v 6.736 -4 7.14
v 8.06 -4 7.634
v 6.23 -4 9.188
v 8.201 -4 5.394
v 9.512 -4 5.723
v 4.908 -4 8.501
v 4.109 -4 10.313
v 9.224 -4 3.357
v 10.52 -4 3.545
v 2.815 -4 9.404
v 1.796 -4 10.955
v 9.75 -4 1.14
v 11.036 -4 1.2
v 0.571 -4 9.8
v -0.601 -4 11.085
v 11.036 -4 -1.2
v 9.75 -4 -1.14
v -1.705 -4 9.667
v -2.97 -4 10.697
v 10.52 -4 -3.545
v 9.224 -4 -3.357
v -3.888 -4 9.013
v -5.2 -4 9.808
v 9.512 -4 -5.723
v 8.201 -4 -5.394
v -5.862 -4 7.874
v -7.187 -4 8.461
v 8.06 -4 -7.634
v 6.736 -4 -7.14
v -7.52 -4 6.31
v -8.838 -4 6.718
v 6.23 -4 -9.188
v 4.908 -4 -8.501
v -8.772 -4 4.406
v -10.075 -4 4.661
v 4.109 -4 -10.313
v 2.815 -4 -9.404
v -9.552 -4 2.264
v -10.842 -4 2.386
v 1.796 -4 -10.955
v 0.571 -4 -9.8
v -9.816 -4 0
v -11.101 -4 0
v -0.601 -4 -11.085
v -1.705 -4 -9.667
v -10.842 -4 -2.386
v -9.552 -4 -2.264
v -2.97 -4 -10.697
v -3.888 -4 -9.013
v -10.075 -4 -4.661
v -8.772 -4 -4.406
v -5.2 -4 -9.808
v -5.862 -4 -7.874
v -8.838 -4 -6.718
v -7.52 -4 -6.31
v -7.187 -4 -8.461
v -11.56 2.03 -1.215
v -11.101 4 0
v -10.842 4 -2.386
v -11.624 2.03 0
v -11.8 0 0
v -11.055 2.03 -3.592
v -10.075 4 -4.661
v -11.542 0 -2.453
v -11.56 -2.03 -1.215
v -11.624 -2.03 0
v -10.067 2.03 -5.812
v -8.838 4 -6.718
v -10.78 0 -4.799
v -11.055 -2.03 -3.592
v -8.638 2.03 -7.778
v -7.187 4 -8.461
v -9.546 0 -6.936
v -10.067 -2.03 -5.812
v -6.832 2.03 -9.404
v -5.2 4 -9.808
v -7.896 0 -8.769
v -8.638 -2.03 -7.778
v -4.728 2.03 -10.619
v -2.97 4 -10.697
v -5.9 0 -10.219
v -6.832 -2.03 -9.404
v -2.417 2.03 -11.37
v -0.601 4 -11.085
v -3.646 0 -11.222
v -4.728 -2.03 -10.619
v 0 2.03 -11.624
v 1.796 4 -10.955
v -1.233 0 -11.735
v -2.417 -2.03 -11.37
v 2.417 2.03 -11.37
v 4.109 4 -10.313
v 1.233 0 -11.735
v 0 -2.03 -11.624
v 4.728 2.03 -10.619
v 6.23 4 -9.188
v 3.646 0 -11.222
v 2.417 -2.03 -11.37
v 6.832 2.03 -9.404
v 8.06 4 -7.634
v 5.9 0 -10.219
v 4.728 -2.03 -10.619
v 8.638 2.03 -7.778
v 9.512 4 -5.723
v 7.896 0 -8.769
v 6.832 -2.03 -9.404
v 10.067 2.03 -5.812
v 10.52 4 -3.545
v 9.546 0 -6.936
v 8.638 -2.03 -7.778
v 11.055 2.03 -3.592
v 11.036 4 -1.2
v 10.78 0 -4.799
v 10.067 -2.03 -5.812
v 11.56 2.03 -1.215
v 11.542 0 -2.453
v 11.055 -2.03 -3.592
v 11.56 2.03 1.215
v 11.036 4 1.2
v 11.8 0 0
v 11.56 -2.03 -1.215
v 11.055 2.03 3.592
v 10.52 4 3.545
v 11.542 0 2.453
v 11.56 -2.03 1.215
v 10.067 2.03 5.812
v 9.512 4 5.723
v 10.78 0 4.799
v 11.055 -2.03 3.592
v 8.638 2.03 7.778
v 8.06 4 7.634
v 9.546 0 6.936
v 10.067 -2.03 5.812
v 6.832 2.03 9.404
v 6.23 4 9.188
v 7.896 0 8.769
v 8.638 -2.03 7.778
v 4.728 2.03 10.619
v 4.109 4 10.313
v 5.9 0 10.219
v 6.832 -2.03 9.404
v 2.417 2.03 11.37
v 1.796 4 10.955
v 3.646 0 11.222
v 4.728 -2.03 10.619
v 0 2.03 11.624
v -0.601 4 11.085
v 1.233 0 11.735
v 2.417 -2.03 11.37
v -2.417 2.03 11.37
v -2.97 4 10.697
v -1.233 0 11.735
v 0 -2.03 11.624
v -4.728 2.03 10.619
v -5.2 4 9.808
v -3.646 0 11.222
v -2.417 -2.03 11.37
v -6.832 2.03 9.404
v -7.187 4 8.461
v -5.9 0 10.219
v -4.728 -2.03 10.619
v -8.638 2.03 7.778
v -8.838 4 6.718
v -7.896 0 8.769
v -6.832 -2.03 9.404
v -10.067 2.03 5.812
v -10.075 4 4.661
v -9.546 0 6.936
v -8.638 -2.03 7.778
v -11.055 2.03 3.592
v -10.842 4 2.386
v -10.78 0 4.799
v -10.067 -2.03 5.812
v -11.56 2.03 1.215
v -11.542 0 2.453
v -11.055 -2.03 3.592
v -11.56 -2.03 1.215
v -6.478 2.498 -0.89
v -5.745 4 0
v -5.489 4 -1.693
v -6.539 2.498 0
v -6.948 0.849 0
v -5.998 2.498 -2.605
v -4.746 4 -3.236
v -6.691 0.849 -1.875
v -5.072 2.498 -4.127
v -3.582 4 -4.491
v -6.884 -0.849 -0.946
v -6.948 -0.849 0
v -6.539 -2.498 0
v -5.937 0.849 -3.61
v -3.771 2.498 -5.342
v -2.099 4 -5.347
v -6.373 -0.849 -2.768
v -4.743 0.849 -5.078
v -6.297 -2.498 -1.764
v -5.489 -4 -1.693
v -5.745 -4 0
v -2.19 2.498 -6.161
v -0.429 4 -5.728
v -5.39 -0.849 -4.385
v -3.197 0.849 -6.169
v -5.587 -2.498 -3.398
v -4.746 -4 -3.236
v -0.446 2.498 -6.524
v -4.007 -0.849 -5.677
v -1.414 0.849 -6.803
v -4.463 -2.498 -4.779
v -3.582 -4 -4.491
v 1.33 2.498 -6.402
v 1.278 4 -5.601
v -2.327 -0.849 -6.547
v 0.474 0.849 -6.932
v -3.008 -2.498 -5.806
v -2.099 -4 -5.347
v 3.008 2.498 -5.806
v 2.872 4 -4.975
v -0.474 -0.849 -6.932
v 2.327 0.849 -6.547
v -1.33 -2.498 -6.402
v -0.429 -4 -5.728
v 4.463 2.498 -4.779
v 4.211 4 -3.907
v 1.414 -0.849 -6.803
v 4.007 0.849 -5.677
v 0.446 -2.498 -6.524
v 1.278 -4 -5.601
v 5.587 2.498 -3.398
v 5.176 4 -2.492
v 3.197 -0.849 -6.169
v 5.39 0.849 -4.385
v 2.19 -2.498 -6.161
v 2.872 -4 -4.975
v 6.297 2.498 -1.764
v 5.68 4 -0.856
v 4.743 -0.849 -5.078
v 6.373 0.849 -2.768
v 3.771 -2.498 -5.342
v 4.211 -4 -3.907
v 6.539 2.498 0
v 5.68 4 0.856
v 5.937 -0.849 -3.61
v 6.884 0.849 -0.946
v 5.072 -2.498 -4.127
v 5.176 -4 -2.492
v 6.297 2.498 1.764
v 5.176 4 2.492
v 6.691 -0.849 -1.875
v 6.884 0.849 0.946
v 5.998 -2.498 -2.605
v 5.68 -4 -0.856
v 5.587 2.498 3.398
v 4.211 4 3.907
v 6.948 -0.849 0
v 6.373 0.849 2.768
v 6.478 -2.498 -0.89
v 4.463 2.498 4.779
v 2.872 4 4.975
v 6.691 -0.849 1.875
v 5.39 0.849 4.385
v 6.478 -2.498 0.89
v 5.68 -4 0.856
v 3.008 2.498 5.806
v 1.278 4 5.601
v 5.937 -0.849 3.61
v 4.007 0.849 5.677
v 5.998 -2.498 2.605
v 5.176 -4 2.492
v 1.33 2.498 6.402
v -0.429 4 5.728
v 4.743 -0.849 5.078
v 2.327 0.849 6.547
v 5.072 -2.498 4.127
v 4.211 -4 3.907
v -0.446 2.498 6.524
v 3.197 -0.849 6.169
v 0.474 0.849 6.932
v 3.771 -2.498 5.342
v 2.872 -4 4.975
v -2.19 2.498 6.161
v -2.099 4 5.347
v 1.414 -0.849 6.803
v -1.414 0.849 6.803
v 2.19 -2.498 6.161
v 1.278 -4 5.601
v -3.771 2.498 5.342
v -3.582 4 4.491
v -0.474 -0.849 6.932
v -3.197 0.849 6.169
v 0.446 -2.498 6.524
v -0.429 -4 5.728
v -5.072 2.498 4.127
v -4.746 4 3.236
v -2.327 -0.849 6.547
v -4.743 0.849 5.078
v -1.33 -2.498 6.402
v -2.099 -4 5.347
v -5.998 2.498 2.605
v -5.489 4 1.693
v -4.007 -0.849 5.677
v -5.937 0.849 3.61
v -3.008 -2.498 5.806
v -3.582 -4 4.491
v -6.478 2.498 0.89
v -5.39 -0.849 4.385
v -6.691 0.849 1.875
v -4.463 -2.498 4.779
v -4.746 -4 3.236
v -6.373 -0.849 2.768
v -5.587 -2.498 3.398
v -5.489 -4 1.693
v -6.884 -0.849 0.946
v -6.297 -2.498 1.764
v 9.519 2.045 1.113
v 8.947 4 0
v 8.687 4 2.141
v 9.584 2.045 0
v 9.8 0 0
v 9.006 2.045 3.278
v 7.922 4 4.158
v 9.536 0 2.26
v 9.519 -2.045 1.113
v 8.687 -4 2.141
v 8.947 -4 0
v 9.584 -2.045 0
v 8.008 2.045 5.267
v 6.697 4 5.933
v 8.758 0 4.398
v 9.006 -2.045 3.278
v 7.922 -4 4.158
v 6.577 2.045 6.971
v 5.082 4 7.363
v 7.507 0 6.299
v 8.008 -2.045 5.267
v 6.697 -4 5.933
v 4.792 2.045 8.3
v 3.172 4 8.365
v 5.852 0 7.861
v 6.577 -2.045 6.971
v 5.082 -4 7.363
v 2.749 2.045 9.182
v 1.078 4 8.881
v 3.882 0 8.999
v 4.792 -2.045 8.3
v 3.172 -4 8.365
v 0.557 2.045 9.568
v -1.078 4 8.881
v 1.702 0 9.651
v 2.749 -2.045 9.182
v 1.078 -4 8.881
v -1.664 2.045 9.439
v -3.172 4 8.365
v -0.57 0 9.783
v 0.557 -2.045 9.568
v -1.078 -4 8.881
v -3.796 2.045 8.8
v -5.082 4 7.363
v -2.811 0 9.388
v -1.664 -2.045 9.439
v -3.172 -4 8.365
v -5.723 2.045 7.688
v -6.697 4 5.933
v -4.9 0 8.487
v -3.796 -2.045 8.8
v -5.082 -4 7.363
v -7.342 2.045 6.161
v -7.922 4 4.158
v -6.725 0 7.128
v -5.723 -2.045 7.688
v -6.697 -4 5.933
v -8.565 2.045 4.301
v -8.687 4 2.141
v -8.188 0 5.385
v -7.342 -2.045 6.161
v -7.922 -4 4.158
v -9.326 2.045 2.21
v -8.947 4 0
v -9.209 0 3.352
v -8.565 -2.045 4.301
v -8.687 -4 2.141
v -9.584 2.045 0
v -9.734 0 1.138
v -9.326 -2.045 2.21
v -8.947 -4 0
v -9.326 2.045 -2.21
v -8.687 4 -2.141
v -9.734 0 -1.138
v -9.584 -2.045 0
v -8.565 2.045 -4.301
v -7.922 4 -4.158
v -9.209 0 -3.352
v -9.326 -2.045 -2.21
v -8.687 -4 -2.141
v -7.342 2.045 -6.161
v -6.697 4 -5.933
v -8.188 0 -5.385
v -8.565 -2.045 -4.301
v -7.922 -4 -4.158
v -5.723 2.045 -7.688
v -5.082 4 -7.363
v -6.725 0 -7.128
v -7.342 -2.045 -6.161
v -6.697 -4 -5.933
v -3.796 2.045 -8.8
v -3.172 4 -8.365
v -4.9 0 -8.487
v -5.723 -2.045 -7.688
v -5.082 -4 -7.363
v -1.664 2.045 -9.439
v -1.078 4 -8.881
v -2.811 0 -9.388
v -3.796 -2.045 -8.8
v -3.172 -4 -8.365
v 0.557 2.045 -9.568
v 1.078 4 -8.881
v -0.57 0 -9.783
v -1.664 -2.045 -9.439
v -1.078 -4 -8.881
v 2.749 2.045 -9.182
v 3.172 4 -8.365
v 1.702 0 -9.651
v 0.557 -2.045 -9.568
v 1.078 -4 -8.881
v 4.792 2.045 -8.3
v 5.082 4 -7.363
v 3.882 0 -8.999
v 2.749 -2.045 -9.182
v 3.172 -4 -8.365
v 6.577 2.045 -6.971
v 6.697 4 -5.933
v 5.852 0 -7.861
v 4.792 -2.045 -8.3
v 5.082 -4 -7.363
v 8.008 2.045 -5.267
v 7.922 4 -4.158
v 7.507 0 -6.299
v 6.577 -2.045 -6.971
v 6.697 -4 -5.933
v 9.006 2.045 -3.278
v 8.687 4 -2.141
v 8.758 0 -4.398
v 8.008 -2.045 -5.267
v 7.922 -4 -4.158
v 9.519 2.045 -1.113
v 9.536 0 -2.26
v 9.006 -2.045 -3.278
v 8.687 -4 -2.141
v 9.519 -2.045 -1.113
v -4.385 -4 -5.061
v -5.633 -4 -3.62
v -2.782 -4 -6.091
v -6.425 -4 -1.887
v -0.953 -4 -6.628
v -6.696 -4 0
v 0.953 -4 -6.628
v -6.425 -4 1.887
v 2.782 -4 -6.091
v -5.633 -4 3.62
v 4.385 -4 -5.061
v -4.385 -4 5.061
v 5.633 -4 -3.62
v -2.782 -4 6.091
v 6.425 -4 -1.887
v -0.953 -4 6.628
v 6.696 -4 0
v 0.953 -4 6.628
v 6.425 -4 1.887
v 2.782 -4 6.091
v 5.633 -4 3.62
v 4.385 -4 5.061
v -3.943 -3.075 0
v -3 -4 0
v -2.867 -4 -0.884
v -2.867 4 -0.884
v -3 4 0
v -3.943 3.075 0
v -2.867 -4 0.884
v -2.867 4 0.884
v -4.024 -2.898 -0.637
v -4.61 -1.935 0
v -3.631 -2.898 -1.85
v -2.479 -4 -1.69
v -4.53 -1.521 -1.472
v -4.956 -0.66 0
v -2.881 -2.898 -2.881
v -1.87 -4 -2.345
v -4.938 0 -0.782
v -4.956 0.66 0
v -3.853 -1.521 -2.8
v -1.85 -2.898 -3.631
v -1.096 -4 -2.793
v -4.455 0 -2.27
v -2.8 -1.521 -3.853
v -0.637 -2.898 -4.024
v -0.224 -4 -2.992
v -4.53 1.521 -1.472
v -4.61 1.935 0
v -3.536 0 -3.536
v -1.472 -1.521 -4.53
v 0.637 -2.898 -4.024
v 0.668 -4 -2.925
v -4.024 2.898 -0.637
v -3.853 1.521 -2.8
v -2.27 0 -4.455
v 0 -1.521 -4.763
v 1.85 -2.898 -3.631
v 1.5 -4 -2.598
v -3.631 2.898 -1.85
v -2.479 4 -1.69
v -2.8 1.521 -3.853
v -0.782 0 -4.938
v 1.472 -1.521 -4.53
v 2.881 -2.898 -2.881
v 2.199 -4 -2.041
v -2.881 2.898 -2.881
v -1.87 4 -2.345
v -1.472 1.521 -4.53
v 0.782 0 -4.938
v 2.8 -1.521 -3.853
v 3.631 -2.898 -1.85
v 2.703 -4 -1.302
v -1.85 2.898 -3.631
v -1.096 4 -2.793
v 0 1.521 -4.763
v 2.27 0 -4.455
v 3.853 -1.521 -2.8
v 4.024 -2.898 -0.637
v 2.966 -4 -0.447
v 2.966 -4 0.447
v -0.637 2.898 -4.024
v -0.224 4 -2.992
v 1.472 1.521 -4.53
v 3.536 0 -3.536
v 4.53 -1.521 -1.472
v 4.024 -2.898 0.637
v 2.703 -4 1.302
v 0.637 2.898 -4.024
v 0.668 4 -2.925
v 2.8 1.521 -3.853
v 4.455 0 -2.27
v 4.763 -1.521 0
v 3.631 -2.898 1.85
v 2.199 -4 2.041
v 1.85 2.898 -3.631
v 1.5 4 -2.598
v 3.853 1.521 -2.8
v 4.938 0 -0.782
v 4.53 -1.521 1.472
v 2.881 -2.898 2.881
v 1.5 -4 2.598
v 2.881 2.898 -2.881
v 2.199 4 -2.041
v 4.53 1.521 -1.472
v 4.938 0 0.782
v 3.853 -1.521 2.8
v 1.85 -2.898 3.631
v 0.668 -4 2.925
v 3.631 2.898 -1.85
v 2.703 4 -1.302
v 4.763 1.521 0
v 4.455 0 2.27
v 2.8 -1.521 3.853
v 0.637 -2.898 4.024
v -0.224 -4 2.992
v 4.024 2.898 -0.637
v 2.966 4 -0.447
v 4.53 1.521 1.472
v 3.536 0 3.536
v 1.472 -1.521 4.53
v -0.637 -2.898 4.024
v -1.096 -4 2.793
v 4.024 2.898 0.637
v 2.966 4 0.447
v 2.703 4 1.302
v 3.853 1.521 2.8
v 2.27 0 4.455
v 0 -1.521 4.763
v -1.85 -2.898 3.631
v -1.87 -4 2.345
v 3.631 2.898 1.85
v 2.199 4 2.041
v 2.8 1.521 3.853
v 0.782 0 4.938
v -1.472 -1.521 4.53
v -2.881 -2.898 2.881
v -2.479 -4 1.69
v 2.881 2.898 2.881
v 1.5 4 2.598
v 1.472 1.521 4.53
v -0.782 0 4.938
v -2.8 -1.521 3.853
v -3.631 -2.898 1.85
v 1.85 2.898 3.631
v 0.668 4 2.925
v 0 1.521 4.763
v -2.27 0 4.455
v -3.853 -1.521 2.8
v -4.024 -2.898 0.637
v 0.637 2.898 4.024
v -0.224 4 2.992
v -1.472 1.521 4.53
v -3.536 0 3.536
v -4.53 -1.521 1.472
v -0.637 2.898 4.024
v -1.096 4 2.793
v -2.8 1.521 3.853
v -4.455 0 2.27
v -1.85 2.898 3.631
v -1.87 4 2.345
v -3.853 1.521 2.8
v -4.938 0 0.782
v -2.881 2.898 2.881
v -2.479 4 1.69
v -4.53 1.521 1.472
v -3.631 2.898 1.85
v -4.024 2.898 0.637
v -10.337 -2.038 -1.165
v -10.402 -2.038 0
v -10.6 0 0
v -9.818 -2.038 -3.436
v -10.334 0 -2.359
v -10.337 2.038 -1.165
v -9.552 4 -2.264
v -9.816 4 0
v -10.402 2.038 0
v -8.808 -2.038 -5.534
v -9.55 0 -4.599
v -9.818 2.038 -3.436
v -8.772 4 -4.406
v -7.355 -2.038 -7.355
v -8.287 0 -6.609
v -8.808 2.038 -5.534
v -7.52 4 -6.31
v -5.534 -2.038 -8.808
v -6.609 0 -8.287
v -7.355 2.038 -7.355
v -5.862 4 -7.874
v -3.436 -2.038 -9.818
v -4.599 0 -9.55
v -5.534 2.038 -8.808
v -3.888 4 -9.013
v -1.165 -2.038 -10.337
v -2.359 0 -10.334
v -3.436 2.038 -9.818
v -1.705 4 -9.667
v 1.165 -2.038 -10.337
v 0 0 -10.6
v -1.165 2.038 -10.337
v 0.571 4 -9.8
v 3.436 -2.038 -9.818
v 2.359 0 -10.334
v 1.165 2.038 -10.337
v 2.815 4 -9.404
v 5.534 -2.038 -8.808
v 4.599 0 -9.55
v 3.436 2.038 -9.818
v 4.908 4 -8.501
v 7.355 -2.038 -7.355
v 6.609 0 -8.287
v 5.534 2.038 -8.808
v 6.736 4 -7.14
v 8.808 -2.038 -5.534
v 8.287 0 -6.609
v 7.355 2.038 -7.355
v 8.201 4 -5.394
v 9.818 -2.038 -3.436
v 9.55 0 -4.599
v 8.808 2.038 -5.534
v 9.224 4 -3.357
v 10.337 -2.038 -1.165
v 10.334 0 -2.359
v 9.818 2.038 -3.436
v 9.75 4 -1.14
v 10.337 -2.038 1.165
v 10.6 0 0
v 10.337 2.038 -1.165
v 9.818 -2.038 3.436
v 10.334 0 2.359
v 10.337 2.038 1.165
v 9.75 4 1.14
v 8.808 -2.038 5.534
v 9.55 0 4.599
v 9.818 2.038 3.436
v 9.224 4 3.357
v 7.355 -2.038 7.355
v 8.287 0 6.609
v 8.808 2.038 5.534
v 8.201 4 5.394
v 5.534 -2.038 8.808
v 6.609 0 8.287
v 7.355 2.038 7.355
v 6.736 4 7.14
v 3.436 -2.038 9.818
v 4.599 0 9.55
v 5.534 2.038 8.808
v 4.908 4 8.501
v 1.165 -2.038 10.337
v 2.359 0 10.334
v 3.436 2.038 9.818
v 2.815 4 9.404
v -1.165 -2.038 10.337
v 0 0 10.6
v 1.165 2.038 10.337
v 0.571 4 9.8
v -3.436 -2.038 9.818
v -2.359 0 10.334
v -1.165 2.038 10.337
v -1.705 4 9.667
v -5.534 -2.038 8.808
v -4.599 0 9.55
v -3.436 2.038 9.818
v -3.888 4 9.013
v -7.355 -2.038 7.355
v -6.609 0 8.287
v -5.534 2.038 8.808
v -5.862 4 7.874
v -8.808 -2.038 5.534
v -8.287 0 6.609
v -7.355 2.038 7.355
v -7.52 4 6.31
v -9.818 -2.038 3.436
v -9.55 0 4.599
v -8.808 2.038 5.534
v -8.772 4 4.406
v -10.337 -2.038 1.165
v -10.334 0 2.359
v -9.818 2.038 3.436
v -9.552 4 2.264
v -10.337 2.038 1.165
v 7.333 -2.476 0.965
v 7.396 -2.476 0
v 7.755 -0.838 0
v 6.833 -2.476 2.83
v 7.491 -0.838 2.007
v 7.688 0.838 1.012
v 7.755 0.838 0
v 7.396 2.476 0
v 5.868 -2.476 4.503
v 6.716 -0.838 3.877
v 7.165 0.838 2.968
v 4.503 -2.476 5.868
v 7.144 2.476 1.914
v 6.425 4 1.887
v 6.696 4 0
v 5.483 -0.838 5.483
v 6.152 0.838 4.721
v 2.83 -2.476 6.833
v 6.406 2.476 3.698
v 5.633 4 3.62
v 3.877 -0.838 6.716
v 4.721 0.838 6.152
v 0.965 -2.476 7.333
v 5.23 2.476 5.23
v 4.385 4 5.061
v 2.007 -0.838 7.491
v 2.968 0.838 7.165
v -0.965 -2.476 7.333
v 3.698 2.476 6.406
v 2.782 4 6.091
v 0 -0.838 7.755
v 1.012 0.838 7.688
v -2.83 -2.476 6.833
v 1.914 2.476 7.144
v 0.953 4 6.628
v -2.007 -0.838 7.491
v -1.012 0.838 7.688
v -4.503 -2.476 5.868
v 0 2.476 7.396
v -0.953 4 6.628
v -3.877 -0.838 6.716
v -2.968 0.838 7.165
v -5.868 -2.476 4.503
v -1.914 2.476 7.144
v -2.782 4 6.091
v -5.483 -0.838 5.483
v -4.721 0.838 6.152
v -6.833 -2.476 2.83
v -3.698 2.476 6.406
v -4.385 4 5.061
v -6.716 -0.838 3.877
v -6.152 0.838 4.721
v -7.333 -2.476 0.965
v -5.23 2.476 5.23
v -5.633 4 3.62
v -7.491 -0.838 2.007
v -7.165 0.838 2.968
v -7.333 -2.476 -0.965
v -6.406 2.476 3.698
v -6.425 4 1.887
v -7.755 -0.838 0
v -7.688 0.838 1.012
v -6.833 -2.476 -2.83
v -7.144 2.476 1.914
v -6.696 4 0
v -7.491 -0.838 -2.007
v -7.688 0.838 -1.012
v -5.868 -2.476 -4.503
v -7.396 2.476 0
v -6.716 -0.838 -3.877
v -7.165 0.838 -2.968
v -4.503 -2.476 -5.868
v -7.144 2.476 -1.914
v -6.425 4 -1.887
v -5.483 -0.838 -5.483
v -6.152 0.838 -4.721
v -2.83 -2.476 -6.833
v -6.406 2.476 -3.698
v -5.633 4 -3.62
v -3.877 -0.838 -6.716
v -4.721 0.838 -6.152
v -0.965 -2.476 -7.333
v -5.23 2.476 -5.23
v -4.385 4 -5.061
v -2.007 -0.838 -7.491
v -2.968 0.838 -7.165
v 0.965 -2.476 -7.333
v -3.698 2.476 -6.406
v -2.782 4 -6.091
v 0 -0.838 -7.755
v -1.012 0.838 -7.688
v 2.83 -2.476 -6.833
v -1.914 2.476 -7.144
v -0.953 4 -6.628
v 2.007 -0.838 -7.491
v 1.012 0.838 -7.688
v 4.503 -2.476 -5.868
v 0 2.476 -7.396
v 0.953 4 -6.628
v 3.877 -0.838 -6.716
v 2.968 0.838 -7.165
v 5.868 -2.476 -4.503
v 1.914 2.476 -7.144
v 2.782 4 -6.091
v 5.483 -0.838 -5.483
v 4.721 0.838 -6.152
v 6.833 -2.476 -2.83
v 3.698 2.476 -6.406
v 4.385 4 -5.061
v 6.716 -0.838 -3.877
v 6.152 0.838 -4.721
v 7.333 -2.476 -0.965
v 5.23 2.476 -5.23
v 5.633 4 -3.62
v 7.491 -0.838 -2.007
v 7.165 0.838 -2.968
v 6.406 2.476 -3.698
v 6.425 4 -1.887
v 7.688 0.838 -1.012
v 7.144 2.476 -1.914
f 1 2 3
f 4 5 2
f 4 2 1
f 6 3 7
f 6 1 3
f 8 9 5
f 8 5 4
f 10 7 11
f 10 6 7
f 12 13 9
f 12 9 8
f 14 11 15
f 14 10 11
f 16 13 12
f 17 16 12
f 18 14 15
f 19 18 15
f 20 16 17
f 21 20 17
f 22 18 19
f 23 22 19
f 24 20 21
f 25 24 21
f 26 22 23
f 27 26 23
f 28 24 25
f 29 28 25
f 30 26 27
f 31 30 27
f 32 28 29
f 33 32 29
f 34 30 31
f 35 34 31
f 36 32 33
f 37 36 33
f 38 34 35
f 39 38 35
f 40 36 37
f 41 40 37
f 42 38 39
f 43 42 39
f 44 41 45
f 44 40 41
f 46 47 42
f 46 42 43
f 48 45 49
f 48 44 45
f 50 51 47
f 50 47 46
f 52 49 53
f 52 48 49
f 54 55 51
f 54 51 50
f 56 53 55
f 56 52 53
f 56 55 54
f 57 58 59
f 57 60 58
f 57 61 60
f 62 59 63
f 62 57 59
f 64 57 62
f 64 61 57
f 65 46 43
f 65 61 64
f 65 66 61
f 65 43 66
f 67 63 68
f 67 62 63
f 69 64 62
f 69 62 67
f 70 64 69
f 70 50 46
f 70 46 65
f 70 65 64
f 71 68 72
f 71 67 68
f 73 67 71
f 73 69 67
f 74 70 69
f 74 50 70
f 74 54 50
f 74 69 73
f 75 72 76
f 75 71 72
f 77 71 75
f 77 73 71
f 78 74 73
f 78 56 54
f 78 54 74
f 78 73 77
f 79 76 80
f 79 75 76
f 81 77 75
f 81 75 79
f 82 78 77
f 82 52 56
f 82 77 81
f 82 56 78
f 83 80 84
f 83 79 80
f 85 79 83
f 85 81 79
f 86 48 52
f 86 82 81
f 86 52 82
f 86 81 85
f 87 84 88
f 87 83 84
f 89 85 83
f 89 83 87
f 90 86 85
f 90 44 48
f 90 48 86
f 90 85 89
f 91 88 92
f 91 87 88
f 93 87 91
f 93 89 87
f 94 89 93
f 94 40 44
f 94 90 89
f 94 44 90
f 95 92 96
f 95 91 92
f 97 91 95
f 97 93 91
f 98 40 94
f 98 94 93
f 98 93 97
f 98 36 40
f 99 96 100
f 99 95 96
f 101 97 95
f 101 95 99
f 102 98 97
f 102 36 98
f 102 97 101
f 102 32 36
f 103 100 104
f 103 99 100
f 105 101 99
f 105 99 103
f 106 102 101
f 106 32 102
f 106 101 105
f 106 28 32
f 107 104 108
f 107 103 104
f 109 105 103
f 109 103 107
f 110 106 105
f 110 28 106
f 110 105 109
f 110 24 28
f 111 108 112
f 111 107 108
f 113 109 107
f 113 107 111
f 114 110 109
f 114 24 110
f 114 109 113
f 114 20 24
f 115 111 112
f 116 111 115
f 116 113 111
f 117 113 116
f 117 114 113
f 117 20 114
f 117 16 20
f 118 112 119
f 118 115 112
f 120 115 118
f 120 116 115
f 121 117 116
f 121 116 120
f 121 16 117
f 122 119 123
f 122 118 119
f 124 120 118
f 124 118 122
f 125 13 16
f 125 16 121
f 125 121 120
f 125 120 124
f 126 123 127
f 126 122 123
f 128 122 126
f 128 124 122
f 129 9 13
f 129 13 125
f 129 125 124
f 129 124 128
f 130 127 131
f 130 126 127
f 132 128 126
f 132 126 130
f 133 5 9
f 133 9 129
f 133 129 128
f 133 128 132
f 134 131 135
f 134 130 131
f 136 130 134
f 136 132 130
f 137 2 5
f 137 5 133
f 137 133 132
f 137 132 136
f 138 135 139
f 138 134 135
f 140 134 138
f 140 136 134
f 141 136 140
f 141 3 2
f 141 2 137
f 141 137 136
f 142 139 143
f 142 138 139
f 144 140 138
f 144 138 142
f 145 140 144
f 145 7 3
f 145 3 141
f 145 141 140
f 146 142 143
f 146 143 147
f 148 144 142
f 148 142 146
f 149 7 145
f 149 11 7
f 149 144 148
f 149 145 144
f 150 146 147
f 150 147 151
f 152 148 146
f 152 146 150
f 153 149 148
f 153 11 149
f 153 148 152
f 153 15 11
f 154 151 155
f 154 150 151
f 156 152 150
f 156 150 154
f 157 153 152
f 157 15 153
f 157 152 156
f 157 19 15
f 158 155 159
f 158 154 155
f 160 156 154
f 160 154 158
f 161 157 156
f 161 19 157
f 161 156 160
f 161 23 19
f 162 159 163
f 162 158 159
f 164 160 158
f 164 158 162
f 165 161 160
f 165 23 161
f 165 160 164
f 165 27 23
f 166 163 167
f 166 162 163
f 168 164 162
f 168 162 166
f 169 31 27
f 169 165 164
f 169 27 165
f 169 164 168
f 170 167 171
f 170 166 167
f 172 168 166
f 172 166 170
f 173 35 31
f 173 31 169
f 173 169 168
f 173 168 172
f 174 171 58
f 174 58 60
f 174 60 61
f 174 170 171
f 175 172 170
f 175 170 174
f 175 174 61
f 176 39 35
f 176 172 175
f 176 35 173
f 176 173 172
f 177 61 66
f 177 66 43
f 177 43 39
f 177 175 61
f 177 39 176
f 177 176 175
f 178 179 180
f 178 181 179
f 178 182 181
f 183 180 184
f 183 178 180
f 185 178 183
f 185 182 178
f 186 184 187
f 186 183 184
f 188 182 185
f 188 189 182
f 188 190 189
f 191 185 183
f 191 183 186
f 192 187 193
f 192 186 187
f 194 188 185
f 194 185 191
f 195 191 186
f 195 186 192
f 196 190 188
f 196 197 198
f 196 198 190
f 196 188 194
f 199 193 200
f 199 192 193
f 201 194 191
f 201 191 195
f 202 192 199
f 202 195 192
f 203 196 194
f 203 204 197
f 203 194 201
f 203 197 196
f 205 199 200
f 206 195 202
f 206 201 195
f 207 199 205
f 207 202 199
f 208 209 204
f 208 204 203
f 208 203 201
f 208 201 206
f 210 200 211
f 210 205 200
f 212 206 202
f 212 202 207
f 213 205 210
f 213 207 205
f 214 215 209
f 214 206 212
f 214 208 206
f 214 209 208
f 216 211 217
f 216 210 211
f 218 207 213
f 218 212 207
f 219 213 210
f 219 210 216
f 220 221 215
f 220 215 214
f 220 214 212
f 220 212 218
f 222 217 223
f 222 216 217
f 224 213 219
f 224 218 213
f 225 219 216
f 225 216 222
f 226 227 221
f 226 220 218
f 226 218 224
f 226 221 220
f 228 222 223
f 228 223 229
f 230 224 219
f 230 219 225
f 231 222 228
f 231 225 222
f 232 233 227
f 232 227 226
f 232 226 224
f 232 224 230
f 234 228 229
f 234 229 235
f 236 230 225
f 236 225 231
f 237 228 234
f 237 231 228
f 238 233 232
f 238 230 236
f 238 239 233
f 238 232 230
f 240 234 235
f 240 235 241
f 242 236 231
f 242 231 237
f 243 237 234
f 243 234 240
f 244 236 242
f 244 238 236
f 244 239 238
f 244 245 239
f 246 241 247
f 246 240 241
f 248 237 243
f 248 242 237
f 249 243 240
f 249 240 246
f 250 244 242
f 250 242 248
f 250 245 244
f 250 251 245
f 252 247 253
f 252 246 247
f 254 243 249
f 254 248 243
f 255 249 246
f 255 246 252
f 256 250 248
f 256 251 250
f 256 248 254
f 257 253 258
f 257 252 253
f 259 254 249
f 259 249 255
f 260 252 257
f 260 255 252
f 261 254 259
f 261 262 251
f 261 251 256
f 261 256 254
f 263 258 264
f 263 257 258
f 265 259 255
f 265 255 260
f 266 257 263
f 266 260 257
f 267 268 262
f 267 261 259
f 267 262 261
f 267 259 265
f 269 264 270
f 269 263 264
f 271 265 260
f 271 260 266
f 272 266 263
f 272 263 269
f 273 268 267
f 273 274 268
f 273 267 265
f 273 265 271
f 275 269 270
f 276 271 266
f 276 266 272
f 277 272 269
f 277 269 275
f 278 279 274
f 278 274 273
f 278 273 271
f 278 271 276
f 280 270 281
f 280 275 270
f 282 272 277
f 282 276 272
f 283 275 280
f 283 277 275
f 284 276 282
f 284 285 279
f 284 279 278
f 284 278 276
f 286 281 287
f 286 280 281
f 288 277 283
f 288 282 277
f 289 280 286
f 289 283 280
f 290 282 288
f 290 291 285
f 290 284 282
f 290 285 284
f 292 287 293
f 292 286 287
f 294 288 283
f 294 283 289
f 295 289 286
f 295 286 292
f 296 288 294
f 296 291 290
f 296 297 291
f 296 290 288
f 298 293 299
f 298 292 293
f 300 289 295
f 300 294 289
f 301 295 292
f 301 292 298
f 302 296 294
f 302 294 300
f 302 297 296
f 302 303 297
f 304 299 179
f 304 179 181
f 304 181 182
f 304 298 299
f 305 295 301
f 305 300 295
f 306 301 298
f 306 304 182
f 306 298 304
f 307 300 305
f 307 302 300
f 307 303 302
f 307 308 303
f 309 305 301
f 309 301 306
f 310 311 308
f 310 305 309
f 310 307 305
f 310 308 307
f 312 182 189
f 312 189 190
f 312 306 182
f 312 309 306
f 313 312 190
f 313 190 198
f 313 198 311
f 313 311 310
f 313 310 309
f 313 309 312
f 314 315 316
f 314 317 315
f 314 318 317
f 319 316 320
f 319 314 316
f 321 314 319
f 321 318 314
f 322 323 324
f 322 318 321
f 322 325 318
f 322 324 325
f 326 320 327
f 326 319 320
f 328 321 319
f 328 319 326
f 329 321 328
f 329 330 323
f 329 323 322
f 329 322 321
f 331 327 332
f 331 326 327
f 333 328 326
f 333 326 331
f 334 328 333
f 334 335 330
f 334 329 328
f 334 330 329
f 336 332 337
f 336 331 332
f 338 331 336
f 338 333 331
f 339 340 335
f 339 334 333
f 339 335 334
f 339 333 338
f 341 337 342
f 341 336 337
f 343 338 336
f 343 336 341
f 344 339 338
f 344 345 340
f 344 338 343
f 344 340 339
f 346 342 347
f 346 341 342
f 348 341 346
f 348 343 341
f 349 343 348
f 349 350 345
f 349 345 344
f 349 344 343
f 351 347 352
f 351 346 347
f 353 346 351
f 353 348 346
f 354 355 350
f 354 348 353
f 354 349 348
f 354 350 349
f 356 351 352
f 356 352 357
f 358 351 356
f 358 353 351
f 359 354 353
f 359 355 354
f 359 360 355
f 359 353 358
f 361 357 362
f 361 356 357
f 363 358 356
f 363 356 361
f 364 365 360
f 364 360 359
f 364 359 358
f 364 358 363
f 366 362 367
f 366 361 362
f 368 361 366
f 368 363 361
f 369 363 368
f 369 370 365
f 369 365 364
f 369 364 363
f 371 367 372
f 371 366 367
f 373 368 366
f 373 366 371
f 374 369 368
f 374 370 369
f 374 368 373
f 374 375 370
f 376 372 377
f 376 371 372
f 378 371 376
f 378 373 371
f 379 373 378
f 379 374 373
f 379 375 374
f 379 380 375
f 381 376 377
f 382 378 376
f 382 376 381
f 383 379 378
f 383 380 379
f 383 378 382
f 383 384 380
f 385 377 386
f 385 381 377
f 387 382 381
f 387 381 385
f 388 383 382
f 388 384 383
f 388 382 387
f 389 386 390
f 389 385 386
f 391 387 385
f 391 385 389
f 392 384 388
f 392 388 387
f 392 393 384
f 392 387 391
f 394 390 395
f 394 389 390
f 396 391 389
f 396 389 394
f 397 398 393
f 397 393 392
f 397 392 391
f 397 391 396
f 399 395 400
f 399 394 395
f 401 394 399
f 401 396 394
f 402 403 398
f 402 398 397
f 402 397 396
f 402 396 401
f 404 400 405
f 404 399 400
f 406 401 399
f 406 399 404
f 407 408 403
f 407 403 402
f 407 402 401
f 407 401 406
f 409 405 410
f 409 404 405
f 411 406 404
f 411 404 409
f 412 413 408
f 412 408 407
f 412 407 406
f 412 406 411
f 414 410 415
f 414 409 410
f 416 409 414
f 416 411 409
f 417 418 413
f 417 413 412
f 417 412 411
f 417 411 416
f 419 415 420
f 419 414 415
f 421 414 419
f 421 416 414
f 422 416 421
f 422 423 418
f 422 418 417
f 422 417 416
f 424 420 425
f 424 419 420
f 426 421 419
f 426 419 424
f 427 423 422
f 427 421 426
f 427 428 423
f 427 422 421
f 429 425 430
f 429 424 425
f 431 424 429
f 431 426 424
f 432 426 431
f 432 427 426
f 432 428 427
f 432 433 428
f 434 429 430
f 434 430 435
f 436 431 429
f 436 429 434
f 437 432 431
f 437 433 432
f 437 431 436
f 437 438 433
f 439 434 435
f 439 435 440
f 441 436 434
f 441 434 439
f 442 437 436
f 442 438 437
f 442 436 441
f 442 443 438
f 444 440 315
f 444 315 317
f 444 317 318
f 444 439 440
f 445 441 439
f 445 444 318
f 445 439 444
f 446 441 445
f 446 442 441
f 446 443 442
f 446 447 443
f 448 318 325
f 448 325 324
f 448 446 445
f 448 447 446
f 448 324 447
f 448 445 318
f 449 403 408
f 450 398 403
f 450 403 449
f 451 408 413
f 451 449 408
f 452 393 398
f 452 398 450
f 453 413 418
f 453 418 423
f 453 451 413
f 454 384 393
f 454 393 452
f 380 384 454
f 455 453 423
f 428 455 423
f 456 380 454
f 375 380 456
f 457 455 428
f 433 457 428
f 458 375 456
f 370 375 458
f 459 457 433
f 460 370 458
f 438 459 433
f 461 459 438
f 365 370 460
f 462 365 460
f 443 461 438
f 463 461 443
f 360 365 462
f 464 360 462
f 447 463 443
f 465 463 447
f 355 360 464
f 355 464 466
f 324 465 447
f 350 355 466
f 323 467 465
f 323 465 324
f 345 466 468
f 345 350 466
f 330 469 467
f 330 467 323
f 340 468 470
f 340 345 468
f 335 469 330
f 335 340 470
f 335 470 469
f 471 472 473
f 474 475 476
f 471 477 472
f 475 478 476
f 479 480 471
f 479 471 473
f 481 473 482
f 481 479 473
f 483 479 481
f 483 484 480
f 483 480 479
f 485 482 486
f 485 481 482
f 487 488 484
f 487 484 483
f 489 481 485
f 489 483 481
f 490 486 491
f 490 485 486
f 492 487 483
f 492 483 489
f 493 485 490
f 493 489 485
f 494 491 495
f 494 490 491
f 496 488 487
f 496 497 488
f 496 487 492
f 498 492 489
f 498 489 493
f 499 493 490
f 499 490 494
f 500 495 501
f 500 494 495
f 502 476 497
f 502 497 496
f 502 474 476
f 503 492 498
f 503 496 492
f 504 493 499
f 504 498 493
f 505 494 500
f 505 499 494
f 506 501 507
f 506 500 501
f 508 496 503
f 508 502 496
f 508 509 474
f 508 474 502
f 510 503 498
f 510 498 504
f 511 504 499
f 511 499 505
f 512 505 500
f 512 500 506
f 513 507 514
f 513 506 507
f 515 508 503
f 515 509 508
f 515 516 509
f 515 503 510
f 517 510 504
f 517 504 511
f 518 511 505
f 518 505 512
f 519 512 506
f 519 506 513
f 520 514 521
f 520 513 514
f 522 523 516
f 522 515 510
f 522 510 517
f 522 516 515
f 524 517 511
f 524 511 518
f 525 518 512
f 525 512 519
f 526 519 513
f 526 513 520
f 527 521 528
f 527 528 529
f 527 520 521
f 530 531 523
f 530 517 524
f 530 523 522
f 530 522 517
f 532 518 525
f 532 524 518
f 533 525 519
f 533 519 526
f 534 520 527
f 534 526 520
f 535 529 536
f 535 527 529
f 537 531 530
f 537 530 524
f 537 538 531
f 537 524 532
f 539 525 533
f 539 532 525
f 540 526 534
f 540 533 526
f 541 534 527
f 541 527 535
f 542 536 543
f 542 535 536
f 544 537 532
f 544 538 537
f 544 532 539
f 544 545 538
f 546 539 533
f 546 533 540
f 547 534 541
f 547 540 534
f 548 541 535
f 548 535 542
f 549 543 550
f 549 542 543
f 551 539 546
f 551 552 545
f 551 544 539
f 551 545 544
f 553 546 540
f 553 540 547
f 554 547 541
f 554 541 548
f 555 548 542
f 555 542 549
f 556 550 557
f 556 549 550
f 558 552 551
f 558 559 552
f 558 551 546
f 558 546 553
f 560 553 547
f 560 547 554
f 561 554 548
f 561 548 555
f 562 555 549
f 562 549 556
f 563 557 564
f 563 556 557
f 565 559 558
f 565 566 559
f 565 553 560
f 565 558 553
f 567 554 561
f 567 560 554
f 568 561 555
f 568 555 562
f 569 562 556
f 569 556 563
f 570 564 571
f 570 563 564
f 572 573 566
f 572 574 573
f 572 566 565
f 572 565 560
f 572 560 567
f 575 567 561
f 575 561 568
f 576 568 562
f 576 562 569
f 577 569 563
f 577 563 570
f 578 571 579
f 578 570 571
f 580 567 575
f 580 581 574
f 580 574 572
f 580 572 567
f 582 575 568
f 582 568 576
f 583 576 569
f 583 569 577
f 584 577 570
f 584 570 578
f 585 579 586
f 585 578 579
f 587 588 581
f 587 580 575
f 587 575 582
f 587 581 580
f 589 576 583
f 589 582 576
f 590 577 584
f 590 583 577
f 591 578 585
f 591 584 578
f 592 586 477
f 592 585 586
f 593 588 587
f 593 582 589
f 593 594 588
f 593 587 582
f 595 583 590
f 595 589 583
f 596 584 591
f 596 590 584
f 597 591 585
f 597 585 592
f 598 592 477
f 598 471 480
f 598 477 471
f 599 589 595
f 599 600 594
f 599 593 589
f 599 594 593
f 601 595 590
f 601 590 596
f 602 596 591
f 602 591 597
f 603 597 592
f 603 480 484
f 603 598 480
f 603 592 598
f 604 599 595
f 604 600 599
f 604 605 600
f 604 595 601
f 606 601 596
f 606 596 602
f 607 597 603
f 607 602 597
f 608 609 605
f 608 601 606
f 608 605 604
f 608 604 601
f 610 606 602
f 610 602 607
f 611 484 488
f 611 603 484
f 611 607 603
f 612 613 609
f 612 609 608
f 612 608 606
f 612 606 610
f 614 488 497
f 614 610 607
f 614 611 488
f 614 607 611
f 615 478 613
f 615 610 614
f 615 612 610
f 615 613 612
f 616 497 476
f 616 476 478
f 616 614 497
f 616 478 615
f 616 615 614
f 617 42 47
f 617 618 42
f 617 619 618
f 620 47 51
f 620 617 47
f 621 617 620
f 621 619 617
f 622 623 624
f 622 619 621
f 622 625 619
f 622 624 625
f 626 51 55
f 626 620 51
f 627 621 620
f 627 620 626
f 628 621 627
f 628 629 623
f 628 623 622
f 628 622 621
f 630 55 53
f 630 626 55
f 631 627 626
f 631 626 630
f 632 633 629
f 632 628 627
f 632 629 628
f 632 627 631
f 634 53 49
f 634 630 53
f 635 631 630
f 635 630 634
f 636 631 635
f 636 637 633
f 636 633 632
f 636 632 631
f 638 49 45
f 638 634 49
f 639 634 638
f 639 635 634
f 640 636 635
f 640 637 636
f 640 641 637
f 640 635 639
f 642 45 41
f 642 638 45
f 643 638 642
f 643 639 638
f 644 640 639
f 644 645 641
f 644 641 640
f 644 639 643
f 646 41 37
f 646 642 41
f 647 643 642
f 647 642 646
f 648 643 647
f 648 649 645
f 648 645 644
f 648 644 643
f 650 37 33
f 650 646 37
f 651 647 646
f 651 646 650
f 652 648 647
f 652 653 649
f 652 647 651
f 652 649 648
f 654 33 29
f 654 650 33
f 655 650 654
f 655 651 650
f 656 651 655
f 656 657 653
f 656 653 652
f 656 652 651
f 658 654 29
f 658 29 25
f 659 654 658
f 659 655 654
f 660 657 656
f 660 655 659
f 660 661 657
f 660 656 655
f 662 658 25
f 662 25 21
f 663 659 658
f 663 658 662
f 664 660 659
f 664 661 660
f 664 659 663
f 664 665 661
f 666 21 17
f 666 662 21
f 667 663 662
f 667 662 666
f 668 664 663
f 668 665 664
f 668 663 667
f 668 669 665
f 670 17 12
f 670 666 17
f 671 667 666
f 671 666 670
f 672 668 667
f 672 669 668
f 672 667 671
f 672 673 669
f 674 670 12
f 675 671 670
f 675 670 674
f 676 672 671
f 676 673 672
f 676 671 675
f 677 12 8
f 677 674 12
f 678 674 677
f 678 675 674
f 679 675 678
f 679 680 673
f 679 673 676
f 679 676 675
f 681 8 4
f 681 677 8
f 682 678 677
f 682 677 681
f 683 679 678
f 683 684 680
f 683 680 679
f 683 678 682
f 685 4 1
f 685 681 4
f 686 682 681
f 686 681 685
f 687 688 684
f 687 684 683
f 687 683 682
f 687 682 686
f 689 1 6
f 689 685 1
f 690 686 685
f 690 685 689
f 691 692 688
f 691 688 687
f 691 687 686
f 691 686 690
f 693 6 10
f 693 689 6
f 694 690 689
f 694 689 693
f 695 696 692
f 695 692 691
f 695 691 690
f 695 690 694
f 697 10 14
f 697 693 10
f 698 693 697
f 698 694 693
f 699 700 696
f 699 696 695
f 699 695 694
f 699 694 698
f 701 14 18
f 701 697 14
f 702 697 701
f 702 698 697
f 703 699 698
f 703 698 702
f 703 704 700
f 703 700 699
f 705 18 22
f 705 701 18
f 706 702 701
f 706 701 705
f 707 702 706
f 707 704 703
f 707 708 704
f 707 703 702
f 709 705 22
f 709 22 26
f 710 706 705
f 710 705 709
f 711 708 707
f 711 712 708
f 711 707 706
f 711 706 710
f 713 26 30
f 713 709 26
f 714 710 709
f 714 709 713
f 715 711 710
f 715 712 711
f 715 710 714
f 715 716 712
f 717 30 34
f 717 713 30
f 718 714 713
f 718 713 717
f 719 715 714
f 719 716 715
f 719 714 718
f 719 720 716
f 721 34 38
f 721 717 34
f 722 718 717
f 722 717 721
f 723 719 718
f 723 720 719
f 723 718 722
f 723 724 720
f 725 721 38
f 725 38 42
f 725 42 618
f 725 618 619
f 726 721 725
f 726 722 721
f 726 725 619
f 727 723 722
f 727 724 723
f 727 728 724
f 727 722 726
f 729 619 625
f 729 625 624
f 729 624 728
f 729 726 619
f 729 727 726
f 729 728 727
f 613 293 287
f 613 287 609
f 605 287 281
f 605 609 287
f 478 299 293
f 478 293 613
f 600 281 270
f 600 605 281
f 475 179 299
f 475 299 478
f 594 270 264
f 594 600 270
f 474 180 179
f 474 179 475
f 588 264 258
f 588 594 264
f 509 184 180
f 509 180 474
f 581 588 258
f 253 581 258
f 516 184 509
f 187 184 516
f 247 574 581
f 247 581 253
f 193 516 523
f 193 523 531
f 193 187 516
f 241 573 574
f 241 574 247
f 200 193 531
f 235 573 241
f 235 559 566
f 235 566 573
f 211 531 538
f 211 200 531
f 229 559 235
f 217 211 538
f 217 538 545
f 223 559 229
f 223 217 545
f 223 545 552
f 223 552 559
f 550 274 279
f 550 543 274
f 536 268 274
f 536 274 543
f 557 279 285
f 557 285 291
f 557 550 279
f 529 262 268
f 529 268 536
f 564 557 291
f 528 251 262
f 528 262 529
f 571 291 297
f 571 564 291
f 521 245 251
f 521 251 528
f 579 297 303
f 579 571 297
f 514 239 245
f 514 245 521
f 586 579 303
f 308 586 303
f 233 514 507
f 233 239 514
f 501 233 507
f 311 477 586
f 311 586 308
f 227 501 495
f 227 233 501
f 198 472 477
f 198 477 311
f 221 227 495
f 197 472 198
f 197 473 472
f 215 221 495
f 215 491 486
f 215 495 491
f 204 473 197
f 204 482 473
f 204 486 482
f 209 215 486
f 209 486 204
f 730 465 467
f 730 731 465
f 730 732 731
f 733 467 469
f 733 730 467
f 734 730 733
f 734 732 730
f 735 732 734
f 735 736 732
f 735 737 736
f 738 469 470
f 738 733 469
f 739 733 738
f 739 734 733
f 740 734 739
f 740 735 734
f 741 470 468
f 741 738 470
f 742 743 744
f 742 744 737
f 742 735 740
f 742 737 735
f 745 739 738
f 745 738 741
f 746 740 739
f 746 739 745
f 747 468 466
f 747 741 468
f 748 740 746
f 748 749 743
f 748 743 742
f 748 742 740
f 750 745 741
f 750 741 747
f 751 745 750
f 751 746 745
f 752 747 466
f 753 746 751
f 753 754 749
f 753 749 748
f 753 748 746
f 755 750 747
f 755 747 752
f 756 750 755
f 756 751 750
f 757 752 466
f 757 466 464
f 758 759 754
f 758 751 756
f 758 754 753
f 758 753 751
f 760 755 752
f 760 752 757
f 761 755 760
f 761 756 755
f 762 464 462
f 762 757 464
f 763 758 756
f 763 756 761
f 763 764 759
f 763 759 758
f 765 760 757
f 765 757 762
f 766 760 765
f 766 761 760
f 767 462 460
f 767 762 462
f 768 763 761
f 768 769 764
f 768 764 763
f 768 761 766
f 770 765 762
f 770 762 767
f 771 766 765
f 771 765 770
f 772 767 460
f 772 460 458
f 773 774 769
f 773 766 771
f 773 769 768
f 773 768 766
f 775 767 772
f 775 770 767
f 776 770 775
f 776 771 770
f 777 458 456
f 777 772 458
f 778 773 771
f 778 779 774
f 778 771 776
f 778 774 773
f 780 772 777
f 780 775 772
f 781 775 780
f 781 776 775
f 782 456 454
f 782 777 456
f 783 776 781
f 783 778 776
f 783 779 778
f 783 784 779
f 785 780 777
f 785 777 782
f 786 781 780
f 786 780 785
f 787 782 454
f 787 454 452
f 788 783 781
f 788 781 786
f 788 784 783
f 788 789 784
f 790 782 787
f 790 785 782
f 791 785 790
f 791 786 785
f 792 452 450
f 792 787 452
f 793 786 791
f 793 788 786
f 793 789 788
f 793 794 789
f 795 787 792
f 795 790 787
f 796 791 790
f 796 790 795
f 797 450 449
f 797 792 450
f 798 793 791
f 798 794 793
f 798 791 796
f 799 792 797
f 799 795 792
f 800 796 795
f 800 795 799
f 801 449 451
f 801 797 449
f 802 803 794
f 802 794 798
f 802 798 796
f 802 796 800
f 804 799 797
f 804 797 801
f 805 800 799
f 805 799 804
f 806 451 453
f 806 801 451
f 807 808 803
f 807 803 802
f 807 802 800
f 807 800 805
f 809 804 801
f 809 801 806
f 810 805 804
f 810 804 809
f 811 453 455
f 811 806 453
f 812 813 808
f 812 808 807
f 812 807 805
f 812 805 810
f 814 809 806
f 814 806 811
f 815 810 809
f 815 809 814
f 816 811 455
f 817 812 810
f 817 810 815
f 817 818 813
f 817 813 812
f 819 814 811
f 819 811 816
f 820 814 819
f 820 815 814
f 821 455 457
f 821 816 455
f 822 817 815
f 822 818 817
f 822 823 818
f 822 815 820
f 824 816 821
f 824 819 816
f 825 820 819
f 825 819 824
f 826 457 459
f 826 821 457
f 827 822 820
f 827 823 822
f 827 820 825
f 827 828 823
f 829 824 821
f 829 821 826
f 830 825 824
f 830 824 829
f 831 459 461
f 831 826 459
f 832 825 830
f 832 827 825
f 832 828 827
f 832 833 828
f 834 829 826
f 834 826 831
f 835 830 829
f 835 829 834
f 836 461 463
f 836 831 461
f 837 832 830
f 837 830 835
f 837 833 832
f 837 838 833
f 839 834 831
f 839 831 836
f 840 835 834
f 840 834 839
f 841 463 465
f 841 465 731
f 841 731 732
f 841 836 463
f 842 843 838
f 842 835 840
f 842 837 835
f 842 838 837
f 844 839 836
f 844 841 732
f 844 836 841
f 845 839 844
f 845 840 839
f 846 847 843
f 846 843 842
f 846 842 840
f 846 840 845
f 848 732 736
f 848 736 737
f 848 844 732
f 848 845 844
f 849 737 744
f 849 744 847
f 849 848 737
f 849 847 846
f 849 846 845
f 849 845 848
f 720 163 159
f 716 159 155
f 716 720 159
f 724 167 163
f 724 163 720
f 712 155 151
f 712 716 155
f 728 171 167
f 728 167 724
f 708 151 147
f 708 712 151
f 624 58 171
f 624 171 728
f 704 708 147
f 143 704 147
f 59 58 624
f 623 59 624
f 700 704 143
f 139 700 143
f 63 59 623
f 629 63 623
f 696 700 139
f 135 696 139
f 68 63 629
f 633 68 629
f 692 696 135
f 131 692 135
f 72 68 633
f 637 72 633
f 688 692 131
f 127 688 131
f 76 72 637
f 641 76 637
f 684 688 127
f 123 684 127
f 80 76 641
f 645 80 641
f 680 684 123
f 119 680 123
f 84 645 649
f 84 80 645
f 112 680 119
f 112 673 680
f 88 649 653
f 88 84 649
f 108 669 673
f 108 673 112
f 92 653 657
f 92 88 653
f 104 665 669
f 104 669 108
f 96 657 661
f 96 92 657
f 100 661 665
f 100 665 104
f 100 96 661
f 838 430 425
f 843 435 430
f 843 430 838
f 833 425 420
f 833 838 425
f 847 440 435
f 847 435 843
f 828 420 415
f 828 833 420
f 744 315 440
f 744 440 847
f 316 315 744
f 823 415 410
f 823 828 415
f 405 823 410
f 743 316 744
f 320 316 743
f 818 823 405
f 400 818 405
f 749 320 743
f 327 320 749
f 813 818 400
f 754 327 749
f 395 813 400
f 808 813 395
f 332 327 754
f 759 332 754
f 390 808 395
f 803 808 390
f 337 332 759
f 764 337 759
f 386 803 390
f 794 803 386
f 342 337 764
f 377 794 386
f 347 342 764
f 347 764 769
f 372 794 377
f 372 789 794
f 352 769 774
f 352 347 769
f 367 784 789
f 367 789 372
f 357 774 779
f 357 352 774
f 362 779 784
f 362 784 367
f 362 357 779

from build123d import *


with BuildPart() as part:
    # Croquis1 → Revolución1 (revolve)
    with BuildSketch(Plane.XY):
        with BuildLine():
            Line((-3, 4), (-5.744562647, 4))
            ThreePointArc((-5.744562647, 4), (-7, 0), (-5.744562647, -4))
            Line((-5.744562647, -4), (-3, -4))
            ThreePointArc((-3, -4), (-5, 0), (-3, 4))
        make_face()
    revolve(axis=Axis((0, 12.754949066, 0), (0, -1, 0)))


with BuildPart() as body_2:
    # Croquis3 → Revolución2 (revolve)
    with BuildSketch(Plane.XY):
        with BuildLine():
            ThreePointArc((6.696267617, -4), (7.8, 0), (6.696267617, 4))
            Line((6.696267617, 4), (8.946507699, 4))
            ThreePointArc((8.946507699, 4), (9.8, 0), (8.946507699, -4))
            Line((8.946507699, -4), (6.696267617, -4))
        make_face()
    revolve(axis=Axis((0, 4.223618172, 0), (0, -1, 0)))


with BuildPart() as body_3:
    # Croquis4 → Revolución3 (revolve)
    with BuildSketch(Plane.XY):
        with BuildLine():
            Line((-9.816312953, 4), (-11.101351269, 4))
            ThreePointArc((-11.101351269, 4), (-11.8, 0), (-11.101351269, -4))
            Line((-11.101351269, -4), (-9.816312953, -4))
            ThreePointArc((-9.816312953, -4), (-10.6, 0), (-9.816312953, 4))
        make_face()
    revolve(axis=Axis((0, 4.326530612, 0), (0, -1, 0)))


solid = Compound([part.part, body_2.part, body_3.part])
